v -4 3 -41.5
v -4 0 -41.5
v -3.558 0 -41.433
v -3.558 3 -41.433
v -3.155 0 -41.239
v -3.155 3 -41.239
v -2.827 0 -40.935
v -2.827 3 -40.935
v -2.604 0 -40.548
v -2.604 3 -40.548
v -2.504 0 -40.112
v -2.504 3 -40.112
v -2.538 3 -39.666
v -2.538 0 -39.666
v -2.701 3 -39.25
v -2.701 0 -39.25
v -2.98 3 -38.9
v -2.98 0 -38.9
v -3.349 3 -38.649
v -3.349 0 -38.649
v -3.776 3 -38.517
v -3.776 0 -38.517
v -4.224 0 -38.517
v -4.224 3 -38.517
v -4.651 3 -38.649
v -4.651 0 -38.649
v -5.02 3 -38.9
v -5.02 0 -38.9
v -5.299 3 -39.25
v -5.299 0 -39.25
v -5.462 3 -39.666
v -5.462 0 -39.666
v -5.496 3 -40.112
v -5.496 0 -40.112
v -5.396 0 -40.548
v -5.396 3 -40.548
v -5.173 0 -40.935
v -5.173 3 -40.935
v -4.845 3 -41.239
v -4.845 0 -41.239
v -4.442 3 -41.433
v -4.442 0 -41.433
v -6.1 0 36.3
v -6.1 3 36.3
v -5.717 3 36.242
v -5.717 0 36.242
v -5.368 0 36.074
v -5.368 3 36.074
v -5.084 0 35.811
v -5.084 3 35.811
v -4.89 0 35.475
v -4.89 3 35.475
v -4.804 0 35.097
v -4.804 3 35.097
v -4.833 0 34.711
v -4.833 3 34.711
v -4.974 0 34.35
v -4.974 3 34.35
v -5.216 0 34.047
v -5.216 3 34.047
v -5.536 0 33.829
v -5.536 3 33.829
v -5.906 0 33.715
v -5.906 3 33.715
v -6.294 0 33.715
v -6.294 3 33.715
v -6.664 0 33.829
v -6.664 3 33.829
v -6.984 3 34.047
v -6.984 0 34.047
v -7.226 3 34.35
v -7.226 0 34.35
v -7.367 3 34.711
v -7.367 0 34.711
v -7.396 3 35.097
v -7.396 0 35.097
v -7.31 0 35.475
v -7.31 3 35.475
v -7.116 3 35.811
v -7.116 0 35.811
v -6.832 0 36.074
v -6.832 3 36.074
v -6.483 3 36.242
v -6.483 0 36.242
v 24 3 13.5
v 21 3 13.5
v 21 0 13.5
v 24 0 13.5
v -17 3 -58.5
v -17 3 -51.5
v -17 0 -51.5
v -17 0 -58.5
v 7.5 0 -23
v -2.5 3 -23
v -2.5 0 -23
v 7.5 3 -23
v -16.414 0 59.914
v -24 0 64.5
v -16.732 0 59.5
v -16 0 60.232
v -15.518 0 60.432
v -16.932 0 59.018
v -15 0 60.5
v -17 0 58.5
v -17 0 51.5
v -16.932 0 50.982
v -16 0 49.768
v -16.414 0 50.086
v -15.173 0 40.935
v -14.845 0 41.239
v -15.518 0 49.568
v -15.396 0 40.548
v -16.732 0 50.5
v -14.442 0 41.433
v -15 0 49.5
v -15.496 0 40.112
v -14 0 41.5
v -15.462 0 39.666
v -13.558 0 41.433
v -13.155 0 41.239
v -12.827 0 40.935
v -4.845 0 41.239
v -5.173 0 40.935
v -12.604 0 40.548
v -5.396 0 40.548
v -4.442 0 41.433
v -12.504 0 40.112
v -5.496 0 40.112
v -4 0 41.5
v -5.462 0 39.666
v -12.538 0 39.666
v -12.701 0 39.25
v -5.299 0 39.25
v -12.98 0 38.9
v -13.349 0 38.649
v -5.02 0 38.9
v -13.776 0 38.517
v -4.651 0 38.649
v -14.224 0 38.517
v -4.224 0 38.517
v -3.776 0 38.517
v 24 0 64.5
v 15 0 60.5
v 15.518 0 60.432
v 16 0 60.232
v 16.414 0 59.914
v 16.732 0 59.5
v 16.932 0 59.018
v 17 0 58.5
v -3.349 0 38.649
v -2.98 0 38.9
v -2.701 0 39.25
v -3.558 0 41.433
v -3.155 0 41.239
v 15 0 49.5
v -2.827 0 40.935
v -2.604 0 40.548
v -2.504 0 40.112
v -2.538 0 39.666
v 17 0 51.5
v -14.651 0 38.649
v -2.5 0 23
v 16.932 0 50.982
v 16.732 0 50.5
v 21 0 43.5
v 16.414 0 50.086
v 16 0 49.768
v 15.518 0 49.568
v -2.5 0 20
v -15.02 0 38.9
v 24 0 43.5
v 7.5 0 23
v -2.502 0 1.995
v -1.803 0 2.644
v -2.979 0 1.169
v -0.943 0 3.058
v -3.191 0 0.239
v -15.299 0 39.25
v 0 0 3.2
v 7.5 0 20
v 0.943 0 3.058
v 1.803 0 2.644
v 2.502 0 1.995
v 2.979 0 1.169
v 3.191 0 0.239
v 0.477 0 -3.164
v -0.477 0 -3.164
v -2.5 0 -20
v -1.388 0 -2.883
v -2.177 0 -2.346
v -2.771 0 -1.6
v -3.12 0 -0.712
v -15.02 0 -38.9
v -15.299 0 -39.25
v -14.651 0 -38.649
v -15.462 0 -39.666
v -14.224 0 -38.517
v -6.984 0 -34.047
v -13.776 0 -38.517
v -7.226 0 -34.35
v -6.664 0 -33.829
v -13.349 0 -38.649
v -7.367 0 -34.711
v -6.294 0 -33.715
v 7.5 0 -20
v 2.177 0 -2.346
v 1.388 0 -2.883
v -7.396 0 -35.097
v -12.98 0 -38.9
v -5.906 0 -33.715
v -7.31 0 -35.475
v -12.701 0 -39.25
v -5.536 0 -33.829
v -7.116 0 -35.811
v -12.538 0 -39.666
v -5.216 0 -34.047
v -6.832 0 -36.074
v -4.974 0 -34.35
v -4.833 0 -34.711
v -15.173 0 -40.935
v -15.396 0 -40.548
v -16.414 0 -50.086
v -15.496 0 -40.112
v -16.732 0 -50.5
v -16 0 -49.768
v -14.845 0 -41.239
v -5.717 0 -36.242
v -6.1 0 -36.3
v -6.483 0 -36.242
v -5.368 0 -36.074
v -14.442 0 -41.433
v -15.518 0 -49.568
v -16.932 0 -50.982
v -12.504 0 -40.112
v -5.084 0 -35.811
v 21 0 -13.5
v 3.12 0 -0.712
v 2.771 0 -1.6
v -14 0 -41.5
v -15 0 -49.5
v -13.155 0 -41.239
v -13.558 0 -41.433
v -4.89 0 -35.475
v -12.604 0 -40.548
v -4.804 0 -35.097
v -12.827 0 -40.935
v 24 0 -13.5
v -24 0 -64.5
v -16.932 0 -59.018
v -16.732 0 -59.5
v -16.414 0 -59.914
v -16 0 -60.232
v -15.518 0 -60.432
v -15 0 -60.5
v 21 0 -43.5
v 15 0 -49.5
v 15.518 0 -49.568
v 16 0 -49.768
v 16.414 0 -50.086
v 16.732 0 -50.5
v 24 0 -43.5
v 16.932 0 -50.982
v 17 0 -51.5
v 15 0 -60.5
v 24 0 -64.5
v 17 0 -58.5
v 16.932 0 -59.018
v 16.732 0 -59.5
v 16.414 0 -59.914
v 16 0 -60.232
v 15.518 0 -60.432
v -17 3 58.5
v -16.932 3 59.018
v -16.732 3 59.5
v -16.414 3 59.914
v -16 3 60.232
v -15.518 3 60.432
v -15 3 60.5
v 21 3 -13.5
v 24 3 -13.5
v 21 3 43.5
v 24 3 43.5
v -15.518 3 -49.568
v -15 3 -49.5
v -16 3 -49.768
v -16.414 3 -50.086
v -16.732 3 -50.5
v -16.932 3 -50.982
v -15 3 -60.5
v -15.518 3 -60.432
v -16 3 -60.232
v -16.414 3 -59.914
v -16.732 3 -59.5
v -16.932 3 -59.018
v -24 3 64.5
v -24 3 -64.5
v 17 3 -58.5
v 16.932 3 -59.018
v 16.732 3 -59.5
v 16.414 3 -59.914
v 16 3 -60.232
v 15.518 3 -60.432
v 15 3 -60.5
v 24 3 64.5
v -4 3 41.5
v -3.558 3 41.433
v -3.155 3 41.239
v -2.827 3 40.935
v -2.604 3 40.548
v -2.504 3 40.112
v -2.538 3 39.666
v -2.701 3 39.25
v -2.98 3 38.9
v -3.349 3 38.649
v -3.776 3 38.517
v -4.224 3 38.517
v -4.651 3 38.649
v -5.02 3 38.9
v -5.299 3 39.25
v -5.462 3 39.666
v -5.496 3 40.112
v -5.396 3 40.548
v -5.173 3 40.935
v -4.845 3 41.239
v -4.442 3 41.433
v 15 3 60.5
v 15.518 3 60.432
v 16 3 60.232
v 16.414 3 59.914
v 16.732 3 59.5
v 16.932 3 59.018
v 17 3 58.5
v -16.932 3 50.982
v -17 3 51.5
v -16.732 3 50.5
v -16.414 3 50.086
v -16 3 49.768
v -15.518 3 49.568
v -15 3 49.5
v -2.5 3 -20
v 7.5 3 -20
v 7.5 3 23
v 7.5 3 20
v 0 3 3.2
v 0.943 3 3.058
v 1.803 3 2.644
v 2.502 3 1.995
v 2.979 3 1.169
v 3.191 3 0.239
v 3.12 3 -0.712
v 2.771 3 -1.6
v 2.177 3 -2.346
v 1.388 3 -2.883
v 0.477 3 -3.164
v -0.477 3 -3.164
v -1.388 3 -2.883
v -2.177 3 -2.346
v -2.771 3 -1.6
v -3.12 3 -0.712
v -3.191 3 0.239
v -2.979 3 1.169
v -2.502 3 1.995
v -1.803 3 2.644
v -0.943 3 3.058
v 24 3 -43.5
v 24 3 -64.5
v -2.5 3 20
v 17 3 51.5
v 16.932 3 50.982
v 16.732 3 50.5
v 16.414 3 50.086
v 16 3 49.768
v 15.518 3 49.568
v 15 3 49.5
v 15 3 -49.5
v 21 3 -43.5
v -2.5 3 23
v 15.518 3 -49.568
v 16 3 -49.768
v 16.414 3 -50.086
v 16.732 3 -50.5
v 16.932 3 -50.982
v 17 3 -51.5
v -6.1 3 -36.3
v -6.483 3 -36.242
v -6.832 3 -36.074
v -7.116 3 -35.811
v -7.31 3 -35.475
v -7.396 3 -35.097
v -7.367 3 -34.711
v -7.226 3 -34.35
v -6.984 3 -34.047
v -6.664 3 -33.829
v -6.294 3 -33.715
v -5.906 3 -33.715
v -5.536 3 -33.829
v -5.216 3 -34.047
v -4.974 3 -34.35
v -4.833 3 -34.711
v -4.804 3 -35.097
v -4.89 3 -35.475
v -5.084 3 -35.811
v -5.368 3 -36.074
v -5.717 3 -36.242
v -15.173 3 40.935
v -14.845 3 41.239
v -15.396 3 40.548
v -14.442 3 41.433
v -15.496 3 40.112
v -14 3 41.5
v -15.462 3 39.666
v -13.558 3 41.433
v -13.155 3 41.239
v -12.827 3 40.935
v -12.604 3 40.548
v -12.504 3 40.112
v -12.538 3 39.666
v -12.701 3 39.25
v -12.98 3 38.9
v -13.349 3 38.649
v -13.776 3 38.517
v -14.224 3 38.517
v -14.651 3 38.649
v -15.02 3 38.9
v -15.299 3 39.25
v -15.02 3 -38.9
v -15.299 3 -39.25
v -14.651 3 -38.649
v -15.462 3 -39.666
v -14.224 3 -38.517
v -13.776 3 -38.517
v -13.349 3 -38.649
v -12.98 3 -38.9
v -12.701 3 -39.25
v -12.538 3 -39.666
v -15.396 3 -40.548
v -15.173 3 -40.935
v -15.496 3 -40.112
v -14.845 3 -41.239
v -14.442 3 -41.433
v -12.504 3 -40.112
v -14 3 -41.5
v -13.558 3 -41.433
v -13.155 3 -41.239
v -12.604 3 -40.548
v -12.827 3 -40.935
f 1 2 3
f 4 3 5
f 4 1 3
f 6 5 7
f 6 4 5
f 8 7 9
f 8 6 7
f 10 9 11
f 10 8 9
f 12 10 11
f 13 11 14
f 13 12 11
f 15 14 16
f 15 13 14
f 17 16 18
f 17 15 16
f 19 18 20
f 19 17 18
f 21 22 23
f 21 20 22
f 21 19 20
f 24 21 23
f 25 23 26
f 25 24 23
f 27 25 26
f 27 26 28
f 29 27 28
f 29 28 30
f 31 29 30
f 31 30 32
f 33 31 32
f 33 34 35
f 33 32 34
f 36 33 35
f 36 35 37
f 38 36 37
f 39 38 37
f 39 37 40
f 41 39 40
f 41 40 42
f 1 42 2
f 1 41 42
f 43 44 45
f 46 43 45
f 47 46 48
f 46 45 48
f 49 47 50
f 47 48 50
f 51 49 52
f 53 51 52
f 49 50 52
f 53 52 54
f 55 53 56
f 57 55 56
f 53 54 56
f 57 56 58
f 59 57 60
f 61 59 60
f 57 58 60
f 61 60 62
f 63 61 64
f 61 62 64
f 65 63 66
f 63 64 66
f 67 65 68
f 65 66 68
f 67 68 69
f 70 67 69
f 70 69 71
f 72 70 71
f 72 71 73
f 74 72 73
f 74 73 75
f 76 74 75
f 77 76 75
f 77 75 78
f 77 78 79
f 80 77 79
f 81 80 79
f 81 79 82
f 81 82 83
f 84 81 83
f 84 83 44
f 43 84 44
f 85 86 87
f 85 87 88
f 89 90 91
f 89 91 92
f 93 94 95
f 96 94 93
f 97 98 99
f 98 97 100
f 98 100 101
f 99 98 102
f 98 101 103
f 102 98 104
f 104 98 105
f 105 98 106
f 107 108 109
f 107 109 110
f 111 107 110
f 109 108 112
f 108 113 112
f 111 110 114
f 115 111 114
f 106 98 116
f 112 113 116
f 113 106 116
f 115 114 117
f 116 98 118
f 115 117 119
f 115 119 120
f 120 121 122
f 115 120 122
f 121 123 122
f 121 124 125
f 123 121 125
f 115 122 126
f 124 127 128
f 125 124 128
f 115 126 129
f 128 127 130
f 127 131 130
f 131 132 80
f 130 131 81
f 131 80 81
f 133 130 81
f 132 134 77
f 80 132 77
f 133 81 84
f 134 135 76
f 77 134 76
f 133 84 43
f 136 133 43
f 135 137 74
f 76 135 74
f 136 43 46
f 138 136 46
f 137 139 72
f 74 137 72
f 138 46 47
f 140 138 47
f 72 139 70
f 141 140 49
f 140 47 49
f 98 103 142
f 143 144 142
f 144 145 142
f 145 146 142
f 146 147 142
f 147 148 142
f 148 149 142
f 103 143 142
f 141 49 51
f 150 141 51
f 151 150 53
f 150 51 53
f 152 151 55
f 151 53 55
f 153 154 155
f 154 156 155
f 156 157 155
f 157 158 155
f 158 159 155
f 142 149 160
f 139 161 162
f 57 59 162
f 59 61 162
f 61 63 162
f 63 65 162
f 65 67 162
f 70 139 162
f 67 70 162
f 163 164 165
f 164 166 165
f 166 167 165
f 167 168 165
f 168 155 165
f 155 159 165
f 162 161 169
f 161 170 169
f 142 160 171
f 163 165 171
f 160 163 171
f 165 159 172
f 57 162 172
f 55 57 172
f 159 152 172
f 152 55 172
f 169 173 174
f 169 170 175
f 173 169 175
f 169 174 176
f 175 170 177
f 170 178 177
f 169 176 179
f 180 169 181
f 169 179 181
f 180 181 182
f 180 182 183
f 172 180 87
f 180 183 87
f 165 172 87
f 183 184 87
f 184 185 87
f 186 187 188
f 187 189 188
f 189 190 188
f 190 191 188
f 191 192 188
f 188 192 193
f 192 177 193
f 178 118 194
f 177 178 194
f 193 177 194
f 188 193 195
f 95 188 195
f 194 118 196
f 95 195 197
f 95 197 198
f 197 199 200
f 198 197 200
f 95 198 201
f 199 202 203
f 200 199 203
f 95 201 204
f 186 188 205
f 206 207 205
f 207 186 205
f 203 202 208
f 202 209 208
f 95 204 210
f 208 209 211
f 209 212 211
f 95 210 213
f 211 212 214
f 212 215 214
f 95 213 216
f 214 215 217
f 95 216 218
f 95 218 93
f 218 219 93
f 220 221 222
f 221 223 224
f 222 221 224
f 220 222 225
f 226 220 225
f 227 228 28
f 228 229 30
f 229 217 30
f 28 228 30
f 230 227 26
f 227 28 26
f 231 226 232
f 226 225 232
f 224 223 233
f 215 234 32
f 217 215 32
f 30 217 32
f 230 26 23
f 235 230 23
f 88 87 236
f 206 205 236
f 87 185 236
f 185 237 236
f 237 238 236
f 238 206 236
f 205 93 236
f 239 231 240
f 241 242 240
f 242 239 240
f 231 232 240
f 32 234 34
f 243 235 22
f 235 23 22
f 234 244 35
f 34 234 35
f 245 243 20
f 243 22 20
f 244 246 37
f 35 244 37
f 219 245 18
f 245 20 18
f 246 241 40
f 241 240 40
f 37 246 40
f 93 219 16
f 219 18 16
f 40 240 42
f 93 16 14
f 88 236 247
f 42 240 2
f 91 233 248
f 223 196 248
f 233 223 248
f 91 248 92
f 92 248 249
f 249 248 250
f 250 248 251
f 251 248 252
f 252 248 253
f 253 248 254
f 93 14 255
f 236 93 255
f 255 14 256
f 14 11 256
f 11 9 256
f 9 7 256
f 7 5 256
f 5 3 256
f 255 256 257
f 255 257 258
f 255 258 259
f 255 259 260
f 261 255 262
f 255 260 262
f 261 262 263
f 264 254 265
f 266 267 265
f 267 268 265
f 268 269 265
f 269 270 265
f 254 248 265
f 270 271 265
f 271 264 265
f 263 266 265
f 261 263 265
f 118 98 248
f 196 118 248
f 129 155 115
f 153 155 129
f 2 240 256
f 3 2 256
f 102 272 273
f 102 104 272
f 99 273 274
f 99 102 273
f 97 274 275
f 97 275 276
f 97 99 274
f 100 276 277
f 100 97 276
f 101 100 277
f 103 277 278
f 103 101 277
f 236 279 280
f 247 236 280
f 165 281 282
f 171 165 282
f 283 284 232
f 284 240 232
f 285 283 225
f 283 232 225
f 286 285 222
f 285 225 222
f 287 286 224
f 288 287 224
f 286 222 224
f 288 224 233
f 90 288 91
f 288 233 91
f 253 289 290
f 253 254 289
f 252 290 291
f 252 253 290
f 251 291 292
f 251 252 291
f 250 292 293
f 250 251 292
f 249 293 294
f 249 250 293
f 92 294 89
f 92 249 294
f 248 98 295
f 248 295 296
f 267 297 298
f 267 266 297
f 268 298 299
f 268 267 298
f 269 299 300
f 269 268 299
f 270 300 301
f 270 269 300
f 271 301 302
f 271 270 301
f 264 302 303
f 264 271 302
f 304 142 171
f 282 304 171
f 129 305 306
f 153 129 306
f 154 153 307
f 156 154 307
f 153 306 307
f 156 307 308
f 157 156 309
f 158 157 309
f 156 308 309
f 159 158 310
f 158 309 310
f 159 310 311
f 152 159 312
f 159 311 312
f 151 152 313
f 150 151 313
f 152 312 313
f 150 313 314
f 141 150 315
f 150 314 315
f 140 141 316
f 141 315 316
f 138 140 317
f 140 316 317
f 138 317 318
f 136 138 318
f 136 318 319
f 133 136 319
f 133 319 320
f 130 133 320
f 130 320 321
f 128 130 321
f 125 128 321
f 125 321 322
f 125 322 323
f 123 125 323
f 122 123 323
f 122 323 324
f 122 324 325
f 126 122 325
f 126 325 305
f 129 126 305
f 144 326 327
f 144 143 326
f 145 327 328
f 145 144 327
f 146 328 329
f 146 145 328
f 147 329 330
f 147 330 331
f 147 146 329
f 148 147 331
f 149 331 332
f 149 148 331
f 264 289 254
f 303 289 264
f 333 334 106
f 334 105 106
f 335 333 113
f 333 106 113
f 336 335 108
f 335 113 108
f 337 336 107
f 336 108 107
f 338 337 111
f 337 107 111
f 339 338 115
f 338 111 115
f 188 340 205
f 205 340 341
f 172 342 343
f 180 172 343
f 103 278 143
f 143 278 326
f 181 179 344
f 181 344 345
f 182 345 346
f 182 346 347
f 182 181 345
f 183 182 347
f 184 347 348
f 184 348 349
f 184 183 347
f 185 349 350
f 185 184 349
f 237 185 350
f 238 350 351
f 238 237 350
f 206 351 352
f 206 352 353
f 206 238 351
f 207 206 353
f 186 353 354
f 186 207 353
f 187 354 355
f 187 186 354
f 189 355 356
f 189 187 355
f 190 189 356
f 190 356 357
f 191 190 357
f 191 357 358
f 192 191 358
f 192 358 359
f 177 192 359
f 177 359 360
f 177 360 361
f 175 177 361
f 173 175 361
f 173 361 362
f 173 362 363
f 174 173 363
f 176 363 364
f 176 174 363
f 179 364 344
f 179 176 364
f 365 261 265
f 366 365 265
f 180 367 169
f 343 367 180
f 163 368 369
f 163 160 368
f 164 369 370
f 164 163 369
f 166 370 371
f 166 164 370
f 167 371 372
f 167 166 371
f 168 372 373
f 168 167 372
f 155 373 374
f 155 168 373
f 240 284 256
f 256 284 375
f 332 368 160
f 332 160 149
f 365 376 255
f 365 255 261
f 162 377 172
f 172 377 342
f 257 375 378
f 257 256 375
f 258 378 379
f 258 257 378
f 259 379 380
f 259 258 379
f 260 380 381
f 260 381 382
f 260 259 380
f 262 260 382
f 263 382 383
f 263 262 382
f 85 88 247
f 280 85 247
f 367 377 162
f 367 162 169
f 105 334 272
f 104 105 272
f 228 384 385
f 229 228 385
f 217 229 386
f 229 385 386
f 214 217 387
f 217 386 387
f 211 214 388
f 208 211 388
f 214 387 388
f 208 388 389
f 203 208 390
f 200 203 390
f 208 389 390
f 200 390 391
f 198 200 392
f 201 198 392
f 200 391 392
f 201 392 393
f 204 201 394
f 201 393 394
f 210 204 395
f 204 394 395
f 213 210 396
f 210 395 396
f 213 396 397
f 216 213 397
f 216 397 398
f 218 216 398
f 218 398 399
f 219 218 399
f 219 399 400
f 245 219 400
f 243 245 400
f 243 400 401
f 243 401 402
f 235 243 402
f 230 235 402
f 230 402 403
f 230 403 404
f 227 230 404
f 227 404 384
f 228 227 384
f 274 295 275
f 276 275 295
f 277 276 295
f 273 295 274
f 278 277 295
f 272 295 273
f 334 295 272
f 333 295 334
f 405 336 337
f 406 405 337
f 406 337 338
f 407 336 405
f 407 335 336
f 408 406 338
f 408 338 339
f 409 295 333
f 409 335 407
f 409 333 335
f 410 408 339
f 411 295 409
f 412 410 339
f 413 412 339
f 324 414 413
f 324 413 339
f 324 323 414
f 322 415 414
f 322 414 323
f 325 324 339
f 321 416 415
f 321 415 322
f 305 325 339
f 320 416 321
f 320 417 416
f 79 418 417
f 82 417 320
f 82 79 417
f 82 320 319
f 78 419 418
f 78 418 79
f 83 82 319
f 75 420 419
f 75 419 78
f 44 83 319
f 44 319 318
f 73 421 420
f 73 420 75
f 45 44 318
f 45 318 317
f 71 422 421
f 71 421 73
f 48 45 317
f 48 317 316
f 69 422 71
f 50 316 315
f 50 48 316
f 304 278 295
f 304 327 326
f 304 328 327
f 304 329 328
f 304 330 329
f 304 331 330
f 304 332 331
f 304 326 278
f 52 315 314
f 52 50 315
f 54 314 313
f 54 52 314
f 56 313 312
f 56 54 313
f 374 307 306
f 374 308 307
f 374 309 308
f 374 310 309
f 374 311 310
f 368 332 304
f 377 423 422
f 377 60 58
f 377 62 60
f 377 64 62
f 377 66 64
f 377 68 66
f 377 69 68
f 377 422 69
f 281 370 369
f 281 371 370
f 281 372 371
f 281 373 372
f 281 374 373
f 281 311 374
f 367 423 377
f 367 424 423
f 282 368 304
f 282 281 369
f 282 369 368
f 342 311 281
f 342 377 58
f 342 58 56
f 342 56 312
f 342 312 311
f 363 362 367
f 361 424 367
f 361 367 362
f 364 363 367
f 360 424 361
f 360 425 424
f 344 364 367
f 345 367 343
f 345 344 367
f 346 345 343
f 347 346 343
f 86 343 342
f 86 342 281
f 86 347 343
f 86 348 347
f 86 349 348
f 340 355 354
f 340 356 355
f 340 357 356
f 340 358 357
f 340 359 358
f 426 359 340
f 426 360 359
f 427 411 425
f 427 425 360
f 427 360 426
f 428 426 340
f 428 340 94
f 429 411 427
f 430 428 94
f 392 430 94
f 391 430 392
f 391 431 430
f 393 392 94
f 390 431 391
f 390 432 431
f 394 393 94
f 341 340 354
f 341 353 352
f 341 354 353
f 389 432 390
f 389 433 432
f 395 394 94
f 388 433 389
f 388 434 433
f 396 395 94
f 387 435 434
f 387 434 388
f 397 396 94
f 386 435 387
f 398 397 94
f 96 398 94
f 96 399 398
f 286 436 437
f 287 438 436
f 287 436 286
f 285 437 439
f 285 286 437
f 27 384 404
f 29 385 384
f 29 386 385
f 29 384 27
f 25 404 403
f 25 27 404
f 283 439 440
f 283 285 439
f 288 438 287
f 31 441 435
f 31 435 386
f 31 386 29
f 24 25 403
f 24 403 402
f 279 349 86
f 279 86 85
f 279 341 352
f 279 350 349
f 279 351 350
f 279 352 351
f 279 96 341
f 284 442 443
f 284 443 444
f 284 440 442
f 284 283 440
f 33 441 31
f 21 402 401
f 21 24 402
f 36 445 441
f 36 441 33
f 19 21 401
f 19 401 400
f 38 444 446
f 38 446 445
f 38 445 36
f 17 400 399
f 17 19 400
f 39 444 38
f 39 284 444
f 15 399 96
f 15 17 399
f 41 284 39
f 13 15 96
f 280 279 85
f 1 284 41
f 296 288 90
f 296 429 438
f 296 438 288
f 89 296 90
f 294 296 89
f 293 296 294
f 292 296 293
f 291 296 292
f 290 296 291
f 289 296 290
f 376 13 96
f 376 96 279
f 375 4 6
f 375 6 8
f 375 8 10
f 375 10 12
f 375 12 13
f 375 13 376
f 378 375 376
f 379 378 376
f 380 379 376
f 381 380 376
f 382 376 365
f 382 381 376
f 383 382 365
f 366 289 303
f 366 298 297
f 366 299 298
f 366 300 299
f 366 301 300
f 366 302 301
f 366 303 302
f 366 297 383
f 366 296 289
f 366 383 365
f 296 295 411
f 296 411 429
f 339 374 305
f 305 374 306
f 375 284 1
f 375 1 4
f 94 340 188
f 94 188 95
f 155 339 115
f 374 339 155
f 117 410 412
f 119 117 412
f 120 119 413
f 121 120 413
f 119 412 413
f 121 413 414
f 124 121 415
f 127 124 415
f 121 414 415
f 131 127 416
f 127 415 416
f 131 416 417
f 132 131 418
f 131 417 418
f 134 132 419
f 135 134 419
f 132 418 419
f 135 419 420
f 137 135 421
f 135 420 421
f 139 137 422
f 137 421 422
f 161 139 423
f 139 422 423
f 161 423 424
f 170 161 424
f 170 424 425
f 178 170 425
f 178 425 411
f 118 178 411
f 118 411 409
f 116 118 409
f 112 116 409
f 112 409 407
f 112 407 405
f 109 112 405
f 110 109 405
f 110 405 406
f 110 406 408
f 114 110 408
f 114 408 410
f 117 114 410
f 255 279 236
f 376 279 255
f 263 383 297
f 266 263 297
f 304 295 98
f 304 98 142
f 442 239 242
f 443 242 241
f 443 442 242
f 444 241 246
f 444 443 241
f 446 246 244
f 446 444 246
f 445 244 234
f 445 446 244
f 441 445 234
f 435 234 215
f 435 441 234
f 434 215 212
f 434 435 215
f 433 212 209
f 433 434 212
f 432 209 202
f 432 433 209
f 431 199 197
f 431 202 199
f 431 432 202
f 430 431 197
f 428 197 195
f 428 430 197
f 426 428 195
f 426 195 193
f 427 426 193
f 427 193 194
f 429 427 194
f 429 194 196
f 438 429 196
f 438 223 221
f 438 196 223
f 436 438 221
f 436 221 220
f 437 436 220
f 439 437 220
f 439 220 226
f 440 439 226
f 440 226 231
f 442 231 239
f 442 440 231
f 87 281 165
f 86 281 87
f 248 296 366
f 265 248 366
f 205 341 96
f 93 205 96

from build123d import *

# Parameters (mm, degrees)
SKETCH1_W            = 48
SKETCH1_H            = 213
SKETCH1_R            = 3.2
BOSS_EXTRUDE1_DEPTH  = 3
SKETCH2_W            = 3
SKETCH2_H            = 21
SKETCH2_H_2          = 30
CUT_EXTRUDE1_DEPTH   = 110.211949896
SKETCH3_W            = 10
SKETCH3_H            = 3
CUT_EXTRUDE2_DEPTH   = 110.211949896
SKETCH4_R            = 1.3
CUT_EXTRUDE3_DEPTH   = 110.211949896
SKETCH5_W            = 48
SKETCH5_H            = 42
CUT_EXTRUDE4_DEPTH   = 110.211949896
SKETCH6_W            = 34
SKETCH6_H            = 11
CUT_EXTRUDE5_DEPTH   = 69.885775019
FILLET1_R            = 2
FILLET1_OF_MIRROR1_R = 2
SKETCH7_R            = 1.5
CUT_EXTRUDE6_DEPTH   = 69.885775019


with BuildPart() as part:
    # Sketch1 → Boss-Extrude1 (new body)
    with BuildSketch(Plane(origin=(0, 0, 0), x_dir=(1, 0, 0), z_dir=(0, 1, 0))):
        Rectangle(SKETCH1_W, SKETCH1_H)
        with Locations(Location((0, 0, 0), (0, 0, 270))):
            Circle(SKETCH1_R, mode=Mode.SUBTRACT)
    extrude(amount=BOSS_EXTRUDE1_DEPTH)

    # Sketch2 → Cut-Extrude1 (cut, through all)
    with BuildSketch(Plane(origin=(0, 3, 0), x_dir=(1, 0, 0), z_dir=(0, 1, 0))):
        with Locations((22.5, 75)):
            Rectangle(SKETCH2_W, SKETCH2_H)
        with Locations((22.5, 28.5)):
            Rectangle(SKETCH2_W, SKETCH2_H_2)
        with Locations((22.5, -28.5)):
            Rectangle(SKETCH2_W, SKETCH2_H_2)
        with Locations((22.5, -75)):
            Rectangle(SKETCH2_W, SKETCH2_H)
    extrude(amount=-CUT_EXTRUDE1_DEPTH, mode=Mode.SUBTRACT)

    # Sketch3 → Cut-Extrude2 (cut, through all)
    with BuildSketch(Plane(origin=(0, 3, 0), x_dir=(1, 0, 0), z_dir=(0, 1, 0))):
        with Locations((2.5, -21.5)):
            Rectangle(SKETCH3_W, SKETCH3_H)
        with Locations((2.5, 21.5)):
            Rectangle(SKETCH3_W, SKETCH3_H)
    extrude(amount=-CUT_EXTRUDE2_DEPTH, mode=Mode.SUBTRACT)

    # Sketch4 → Cut-Extrude3 (cut, through all)
    with BuildSketch(Plane(origin=(0, 3, 0), x_dir=(1, 0, 0), z_dir=(0, 1, 0))):
        with Locations(Location((-6.1, -35, 0), (0, 0, 270))):
            Circle(SKETCH4_R)
        with Locations(Location((-6.1, 35, 0), (0, 0, 90))):
            Circle(SKETCH4_R)
    extrude(amount=-CUT_EXTRUDE3_DEPTH, mode=Mode.SUBTRACT)

    # Sketch5 → Cut-Extrude4 (cut, through all)
    with BuildSketch(Plane(origin=(0, 3, 0), x_dir=(1, 0, 0), z_dir=(0, 1, 0))):
        with Locations((0, 85.5)):
            Rectangle(SKETCH5_W, SKETCH5_H)
        with Locations((0, -85.5)):
            Rectangle(SKETCH5_W, SKETCH5_H)
    extrude(amount=-CUT_EXTRUDE4_DEPTH, mode=Mode.SUBTRACT)

    # Sketch6 → Cut-Extrude5 (cut, through all)
    with BuildSketch(Plane(origin=(0, 3, 0), x_dir=(1, 0, 0), z_dir=(0, 1, 0))):
        with Locations((0, 55)):
            Rectangle(SKETCH6_W, SKETCH6_H)
    cut_extrude5 = extrude(amount=-CUT_EXTRUDE5_DEPTH, mode=Mode.SUBTRACT)

    # Fillet1
    fillet1_edges = [part.edges().sort_by_distance(p)[0] for p in [
        (-17, 1.5, -49.5),
        (-17, 1.5, -60.5),
        (17, 1.5, -60.5),
        (17, 1.5, -49.5),
    ]]
    fillet(fillet1_edges, radius=FILLET1_R)

    # Mirror1: Cut-Extrude5 across plane
    add(cut_extrude5.mirror(Plane.XY), mode=Mode.SUBTRACT)

    # Fillet1 of Mirror1
    fillet1_of_mirror1_edges = [part.edges().sort_by_distance(p)[0] for p in [
        (-17, 1.5, 49.5),
        (-17, 1.5, 60.5),
        (17, 1.5, 60.5),
        (17, 1.5, 49.5),
    ]]
    fillet(fillet1_of_mirror1_edges, radius=FILLET1_OF_MIRROR1_R)

    # Sketch7 → Cut-Extrude6 (cut, through all)
    with BuildSketch(Plane(origin=(0, 3, 0), x_dir=(1, 0, 0), z_dir=(0, 1, 0))):
        with Locations(Location((-14, -40, 0), (0, 0, 270))):
            Circle(SKETCH7_R)
        with Locations(Location((-4, -40, 0), (0, 0, 270))):
            Circle(SKETCH7_R)
    cut_extrude6 = extrude(amount=-CUT_EXTRUDE6_DEPTH, mode=Mode.SUBTRACT)

    # Mirror2: Cut-Extrude6 across plane
    add(cut_extrude6.mirror(Plane.XY), mode=Mode.SUBTRACT)


solid = part.part
